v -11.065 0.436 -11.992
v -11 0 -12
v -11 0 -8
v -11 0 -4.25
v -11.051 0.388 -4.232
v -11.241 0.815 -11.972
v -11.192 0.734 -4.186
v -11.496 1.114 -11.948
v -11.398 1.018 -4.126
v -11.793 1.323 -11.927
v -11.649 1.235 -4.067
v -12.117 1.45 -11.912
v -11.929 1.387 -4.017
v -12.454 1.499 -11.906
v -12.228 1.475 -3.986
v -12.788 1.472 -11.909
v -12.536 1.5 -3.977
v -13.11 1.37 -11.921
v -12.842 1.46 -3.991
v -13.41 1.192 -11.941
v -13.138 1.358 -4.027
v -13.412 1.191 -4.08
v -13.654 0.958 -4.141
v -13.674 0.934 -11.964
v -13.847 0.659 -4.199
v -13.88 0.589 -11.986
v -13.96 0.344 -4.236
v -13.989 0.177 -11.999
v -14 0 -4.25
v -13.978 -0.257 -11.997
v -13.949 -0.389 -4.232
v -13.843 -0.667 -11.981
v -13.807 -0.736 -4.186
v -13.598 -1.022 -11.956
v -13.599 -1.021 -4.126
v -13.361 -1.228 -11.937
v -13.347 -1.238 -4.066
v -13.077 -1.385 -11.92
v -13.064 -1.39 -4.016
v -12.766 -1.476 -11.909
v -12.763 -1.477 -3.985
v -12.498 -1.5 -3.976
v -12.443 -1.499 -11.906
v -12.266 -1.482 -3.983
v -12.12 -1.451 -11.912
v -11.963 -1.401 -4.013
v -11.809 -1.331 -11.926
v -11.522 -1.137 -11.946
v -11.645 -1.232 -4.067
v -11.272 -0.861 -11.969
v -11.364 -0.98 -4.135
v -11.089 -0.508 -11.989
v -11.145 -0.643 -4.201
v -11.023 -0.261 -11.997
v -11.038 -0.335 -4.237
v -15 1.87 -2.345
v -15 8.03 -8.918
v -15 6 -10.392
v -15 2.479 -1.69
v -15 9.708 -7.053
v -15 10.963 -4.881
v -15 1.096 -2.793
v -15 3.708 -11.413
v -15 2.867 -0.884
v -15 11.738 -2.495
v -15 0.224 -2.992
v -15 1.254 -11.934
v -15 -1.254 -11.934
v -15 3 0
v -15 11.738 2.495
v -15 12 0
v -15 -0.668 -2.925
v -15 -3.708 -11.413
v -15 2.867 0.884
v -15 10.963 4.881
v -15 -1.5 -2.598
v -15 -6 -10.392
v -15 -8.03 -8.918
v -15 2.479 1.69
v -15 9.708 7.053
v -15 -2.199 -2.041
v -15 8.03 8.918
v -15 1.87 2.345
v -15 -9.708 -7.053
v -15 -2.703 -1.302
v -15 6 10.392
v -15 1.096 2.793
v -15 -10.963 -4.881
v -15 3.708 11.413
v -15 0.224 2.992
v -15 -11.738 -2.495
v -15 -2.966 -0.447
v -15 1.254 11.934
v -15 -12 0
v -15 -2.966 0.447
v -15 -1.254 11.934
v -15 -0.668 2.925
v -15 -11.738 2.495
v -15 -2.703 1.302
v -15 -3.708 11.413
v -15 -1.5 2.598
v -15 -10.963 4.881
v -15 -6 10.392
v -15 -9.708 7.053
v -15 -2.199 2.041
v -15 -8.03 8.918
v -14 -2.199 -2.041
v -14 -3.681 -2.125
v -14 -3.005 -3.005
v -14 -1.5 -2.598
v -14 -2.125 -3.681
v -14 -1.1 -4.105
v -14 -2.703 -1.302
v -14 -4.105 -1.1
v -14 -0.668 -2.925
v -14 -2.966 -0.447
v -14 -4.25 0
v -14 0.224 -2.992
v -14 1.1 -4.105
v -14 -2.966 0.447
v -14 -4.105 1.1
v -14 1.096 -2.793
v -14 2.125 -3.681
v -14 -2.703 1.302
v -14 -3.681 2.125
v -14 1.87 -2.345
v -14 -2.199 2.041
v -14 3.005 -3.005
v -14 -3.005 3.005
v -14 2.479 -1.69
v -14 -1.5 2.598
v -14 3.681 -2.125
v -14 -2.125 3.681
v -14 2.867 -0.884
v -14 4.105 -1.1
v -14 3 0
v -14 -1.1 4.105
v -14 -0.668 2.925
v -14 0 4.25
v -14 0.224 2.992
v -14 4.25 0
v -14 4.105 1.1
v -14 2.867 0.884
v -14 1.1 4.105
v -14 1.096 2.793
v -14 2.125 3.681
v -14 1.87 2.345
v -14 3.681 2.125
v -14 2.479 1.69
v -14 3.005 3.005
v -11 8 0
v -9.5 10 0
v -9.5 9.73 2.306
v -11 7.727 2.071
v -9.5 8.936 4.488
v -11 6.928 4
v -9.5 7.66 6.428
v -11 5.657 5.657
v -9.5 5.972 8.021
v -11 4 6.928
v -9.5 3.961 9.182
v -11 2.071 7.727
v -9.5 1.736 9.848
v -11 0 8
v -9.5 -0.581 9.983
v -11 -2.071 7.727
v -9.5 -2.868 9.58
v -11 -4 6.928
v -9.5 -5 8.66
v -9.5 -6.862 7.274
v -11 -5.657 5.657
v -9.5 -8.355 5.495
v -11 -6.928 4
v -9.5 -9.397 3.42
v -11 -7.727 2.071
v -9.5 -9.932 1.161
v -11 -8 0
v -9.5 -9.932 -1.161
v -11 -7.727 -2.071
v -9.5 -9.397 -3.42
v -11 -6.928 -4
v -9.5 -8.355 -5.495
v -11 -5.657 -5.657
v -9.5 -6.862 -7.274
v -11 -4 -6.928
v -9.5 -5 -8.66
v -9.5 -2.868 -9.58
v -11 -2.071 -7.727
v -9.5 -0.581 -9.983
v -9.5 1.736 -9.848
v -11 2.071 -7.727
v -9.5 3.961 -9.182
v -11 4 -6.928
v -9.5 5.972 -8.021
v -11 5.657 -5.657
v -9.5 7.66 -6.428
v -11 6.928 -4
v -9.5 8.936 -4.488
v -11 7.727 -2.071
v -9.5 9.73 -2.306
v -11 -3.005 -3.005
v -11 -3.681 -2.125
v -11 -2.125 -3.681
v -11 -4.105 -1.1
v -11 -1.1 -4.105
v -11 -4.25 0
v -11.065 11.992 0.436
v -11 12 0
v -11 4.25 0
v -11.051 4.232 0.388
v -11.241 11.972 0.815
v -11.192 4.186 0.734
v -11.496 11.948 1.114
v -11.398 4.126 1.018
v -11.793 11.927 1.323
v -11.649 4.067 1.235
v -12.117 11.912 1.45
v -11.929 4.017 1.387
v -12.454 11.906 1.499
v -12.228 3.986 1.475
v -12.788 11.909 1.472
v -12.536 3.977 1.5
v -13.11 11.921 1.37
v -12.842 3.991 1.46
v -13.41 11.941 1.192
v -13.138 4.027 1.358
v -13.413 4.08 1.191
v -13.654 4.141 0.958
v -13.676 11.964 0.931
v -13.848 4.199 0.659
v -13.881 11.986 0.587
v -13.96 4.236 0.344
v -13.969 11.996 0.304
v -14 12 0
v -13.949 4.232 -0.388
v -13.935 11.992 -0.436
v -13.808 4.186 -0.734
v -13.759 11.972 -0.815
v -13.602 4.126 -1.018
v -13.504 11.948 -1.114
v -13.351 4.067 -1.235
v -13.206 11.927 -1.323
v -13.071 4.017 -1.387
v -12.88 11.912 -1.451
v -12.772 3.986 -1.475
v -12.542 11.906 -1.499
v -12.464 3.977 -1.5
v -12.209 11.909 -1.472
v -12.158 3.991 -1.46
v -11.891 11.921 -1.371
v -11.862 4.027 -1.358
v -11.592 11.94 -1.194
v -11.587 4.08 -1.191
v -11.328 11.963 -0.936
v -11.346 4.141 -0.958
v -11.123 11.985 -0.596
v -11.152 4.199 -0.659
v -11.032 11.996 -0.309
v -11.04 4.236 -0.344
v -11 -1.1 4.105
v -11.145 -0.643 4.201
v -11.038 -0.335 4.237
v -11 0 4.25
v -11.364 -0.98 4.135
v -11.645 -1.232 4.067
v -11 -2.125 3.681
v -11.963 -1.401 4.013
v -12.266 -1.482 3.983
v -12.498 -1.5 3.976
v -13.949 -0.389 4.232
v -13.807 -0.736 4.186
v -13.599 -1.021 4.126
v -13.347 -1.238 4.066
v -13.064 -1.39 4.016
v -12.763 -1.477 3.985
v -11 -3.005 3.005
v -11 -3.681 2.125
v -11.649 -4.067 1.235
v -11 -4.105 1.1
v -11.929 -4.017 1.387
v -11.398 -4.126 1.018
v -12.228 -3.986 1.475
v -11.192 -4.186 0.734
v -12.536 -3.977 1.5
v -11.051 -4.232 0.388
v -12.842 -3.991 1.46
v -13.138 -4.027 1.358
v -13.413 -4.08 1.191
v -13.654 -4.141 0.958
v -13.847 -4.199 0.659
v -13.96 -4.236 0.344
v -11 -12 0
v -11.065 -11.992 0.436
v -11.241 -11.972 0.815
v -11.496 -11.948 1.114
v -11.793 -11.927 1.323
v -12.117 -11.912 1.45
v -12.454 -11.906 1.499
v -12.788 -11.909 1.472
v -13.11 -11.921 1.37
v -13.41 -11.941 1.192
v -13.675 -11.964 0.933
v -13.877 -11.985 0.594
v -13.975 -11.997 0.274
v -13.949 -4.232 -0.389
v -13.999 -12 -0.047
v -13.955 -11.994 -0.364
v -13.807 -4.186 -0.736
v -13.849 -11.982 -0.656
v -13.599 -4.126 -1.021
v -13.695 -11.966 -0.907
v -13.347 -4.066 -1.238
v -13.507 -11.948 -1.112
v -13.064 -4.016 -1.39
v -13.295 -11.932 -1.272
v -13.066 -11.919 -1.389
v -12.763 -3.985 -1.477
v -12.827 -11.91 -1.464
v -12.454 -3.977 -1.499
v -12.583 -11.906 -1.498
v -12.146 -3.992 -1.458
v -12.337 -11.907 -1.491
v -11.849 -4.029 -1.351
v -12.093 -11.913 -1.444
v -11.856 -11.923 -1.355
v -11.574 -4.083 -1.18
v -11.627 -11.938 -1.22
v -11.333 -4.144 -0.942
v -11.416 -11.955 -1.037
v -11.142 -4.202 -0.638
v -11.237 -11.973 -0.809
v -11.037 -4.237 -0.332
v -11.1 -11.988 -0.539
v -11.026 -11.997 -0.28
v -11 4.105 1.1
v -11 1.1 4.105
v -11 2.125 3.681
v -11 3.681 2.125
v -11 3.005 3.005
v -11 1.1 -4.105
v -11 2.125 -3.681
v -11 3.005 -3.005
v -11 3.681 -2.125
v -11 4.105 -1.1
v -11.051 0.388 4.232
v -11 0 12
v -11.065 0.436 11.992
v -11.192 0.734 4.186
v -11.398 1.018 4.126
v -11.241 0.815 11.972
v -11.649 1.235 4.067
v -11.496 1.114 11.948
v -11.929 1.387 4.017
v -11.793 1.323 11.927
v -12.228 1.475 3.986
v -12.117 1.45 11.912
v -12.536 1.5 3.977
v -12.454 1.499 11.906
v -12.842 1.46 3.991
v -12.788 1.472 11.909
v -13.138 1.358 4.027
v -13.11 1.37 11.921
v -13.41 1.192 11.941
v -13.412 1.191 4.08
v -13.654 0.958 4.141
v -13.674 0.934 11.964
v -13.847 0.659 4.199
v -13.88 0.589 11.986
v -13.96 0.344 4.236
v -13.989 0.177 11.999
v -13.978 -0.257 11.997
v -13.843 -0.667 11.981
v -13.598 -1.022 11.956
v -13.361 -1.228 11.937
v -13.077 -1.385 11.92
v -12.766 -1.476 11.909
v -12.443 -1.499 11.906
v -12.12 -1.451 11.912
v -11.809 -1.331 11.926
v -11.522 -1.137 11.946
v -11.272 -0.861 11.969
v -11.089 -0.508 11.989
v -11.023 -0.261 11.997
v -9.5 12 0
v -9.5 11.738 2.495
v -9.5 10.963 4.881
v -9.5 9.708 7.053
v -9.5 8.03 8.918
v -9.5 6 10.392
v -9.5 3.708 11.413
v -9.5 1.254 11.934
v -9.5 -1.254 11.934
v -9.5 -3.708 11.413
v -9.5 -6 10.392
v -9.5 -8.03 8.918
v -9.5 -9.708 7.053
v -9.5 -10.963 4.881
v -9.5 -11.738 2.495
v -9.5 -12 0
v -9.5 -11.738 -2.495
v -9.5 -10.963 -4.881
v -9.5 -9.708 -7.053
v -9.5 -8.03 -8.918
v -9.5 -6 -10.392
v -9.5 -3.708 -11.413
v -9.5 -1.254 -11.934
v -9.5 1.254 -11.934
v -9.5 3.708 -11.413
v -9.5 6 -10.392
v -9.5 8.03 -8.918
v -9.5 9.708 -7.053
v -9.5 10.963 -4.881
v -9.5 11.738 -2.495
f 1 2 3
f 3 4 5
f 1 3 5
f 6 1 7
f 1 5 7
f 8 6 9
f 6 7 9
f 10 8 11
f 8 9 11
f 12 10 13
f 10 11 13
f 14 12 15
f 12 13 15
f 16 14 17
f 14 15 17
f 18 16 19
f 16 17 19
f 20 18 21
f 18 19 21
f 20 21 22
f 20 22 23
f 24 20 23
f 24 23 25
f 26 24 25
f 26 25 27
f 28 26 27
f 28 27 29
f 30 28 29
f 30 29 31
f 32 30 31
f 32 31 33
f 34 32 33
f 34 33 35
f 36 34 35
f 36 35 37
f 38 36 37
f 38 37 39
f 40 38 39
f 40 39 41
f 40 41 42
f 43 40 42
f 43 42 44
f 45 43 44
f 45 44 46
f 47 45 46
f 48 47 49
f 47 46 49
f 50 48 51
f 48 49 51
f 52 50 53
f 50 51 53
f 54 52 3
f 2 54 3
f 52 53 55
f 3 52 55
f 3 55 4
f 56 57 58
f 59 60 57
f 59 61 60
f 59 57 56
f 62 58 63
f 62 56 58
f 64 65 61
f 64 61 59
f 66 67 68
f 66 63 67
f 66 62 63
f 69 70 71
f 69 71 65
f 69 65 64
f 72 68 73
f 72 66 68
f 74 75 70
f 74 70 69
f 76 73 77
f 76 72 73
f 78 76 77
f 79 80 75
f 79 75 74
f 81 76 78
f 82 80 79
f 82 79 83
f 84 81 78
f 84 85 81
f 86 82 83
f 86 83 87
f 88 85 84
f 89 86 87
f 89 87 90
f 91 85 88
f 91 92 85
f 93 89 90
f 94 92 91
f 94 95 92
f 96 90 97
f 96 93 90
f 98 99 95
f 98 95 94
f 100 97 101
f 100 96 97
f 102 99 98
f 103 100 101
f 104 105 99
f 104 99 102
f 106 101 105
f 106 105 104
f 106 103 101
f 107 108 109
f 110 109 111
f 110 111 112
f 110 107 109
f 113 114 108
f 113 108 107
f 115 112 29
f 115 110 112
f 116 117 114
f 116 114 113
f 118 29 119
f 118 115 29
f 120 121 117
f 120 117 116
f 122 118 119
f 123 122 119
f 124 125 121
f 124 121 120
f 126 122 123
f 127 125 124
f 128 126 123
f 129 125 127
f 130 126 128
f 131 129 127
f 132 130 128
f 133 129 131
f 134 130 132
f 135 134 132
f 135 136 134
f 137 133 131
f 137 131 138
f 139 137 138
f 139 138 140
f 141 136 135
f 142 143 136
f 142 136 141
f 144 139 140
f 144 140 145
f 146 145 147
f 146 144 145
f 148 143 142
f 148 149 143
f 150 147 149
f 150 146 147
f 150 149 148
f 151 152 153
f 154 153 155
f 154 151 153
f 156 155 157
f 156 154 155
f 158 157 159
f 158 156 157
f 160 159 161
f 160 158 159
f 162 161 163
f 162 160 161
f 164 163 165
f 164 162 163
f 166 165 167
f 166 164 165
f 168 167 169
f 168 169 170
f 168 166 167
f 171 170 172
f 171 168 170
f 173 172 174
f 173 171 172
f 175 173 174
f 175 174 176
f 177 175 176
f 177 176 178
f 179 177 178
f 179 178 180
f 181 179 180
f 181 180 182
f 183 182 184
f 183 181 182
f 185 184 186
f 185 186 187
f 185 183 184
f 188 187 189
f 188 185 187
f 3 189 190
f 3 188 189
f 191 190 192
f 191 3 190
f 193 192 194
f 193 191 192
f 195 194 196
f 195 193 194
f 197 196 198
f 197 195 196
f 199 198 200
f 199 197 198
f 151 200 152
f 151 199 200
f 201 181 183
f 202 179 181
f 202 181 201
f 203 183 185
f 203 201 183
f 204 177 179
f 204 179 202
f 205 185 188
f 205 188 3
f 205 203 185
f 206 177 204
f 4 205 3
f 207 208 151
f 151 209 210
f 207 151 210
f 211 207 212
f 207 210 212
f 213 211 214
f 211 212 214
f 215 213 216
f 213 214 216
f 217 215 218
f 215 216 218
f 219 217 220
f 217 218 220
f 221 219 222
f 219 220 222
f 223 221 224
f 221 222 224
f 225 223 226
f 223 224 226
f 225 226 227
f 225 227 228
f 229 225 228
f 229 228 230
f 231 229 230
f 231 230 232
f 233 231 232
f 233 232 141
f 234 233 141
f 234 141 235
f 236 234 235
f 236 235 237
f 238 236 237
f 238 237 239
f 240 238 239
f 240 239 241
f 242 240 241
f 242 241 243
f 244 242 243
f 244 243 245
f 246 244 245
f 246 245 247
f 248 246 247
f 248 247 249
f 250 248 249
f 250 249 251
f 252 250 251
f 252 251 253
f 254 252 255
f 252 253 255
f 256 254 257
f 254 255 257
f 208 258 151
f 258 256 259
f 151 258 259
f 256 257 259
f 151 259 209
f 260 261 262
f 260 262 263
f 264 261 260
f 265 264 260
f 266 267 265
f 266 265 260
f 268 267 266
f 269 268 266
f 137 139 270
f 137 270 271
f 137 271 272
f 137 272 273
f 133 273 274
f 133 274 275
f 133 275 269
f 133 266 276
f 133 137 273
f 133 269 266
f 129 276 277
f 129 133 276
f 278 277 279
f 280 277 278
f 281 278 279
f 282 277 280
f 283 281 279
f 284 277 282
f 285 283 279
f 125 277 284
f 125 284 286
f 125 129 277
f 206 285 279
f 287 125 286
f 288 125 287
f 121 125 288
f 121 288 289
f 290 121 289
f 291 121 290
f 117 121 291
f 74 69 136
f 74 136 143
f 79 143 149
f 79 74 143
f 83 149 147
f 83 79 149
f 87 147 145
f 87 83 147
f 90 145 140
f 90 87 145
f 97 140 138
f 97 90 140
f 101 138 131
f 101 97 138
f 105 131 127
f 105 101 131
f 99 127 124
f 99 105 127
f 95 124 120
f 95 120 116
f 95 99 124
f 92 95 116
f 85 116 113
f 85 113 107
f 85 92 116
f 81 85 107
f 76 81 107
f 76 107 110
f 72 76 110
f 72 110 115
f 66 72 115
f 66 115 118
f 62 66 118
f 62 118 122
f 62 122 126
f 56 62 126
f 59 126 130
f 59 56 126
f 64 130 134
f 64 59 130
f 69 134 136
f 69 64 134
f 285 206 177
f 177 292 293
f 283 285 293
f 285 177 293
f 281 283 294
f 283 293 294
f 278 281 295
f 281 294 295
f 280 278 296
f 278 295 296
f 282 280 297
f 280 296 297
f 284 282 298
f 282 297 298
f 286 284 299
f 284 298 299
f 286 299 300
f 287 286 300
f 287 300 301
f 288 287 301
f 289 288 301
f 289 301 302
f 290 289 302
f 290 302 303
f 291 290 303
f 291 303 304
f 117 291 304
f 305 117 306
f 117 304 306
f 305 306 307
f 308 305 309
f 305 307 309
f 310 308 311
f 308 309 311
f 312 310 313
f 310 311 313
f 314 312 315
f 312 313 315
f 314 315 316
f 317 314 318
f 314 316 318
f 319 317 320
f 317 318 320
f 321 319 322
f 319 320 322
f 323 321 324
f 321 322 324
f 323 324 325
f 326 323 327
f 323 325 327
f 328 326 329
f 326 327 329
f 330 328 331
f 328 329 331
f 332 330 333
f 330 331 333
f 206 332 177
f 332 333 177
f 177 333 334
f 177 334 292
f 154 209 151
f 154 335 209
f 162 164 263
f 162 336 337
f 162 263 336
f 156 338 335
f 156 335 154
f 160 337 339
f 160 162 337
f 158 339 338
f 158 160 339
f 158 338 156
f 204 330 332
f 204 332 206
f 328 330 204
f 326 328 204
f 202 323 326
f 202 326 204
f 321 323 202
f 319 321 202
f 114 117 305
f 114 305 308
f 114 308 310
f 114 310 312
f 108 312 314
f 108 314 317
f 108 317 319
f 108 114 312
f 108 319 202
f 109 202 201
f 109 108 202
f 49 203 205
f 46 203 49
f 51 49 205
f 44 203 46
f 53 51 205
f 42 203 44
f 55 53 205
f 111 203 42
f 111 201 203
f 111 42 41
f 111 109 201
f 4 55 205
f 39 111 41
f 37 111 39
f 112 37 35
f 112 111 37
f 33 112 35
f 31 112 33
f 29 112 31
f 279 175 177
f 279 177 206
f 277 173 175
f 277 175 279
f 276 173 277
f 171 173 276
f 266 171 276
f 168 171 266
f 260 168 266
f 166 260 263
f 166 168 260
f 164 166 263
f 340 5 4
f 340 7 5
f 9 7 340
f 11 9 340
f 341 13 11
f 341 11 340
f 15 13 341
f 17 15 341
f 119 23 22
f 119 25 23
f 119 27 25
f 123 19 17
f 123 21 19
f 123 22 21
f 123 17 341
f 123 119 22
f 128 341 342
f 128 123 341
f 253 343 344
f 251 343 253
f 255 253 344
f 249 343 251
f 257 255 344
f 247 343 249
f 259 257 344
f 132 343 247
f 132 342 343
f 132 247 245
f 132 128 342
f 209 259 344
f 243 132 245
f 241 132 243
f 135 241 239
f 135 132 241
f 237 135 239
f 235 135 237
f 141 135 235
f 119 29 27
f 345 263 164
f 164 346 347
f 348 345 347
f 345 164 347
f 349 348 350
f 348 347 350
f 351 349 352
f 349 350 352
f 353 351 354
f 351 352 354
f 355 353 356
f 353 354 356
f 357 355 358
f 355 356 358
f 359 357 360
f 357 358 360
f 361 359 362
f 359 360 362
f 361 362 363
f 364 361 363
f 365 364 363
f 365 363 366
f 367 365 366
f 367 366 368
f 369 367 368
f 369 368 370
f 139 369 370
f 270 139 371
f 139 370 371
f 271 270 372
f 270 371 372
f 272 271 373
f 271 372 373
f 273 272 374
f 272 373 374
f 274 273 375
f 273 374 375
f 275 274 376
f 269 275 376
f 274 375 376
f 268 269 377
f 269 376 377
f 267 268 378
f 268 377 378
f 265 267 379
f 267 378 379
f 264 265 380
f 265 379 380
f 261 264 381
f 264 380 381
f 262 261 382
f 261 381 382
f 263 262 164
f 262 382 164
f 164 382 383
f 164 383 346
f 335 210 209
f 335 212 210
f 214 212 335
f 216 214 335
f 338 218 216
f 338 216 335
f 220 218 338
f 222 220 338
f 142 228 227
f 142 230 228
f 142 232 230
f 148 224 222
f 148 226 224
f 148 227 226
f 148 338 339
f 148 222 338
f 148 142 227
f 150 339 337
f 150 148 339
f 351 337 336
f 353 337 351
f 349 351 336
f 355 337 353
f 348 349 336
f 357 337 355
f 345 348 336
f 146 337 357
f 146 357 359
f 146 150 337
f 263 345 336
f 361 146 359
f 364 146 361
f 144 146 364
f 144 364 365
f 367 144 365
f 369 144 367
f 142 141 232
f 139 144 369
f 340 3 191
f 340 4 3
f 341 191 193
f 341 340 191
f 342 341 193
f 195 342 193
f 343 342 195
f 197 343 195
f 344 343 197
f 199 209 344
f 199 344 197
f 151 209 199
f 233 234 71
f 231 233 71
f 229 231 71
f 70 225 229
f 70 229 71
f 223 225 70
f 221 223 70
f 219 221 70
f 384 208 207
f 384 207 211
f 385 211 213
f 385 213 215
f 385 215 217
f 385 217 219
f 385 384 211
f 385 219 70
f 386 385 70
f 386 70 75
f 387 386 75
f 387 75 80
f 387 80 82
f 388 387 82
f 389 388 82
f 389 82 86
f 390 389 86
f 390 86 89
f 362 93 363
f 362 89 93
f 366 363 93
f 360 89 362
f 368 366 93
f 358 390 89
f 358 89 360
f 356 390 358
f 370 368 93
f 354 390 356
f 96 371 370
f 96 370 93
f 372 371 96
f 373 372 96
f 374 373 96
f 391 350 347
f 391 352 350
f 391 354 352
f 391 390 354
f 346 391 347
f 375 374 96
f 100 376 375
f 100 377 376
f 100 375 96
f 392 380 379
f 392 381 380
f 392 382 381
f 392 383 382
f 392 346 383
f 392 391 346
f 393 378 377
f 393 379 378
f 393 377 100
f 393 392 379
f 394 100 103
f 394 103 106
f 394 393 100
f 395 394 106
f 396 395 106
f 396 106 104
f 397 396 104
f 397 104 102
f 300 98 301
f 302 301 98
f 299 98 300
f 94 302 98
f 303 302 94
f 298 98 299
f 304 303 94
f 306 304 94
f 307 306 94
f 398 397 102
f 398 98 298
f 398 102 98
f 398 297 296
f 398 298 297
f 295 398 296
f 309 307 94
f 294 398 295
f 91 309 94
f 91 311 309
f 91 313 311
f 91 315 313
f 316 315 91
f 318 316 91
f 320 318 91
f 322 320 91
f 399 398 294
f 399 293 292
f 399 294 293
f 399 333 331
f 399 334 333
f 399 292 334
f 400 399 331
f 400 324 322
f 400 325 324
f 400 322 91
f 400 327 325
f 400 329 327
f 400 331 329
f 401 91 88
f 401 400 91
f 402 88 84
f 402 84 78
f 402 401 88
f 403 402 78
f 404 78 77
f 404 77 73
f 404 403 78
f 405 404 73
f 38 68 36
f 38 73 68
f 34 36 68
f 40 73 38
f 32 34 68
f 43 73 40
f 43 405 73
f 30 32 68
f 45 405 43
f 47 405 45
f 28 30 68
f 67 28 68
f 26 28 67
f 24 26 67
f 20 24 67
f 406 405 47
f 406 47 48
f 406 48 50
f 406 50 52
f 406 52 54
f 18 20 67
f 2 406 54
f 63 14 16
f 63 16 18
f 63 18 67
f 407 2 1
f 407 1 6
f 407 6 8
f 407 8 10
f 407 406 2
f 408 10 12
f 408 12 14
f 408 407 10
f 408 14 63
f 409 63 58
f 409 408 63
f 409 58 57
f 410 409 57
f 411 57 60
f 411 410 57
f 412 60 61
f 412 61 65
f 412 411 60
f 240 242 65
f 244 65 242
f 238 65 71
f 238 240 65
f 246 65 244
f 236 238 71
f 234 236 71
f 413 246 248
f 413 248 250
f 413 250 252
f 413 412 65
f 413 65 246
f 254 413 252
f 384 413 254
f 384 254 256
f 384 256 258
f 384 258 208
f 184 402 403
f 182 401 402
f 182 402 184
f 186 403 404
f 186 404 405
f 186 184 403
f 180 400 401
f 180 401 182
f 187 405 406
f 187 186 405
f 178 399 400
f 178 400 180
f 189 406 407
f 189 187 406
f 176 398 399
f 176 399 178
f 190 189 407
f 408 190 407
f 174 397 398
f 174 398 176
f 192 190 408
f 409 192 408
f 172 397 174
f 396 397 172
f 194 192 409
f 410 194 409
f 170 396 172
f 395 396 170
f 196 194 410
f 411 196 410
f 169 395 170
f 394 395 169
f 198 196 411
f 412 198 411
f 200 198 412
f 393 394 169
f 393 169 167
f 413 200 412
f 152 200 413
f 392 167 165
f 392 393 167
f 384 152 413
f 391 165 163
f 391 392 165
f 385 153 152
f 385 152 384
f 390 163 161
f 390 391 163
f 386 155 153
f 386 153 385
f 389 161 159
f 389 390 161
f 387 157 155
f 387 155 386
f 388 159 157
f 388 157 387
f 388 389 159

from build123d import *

# Parameters (mm, degrees)
SKETCH085_R  = 1.5
PAD064_DEPTH = 25
SKETCH082_R  = 1.5
PAD063_DEPTH = 25


with BuildPart() as pad064:
    # Sketch085 → Pad064 (new body, symmetric)
    with BuildSketch(Plane.XY):
        with Locations((-12.5, 0)):
            Circle(SKETCH085_R)
    extrude(amount=PAD064_DEPTH, both=True)


with BuildPart() as screwcutout:
    # Sketch082 → Pad063 (new body, symmetric)
    with BuildSketch(Plane.XZ):
        with Locations((-12.5, 0)):
            Circle(SKETCH082_R)
    extrude(amount=PAD063_DEPTH, both=True)

    # Fusion004024: union Pad064
    add(pad064.part)


with BuildPart() as endcap:
    # Sketch083 → Revolution (revolve)
    with BuildSketch(Plane.XY):
        Polygon((-15, 3), (-15, 12), (-9.5, 12), (-9.5, 10), (-11, 8), (-11, 4.25), (-14, 4.25), (-14, 3), align=None)
    revolve(axis=Axis((0, 0, 0), (1, 0, 0)))

    # Cut007019003: cut ScrewCutout
    add(screwcutout.part, mode=Mode.SUBTRACT)


solid = endcap.part
